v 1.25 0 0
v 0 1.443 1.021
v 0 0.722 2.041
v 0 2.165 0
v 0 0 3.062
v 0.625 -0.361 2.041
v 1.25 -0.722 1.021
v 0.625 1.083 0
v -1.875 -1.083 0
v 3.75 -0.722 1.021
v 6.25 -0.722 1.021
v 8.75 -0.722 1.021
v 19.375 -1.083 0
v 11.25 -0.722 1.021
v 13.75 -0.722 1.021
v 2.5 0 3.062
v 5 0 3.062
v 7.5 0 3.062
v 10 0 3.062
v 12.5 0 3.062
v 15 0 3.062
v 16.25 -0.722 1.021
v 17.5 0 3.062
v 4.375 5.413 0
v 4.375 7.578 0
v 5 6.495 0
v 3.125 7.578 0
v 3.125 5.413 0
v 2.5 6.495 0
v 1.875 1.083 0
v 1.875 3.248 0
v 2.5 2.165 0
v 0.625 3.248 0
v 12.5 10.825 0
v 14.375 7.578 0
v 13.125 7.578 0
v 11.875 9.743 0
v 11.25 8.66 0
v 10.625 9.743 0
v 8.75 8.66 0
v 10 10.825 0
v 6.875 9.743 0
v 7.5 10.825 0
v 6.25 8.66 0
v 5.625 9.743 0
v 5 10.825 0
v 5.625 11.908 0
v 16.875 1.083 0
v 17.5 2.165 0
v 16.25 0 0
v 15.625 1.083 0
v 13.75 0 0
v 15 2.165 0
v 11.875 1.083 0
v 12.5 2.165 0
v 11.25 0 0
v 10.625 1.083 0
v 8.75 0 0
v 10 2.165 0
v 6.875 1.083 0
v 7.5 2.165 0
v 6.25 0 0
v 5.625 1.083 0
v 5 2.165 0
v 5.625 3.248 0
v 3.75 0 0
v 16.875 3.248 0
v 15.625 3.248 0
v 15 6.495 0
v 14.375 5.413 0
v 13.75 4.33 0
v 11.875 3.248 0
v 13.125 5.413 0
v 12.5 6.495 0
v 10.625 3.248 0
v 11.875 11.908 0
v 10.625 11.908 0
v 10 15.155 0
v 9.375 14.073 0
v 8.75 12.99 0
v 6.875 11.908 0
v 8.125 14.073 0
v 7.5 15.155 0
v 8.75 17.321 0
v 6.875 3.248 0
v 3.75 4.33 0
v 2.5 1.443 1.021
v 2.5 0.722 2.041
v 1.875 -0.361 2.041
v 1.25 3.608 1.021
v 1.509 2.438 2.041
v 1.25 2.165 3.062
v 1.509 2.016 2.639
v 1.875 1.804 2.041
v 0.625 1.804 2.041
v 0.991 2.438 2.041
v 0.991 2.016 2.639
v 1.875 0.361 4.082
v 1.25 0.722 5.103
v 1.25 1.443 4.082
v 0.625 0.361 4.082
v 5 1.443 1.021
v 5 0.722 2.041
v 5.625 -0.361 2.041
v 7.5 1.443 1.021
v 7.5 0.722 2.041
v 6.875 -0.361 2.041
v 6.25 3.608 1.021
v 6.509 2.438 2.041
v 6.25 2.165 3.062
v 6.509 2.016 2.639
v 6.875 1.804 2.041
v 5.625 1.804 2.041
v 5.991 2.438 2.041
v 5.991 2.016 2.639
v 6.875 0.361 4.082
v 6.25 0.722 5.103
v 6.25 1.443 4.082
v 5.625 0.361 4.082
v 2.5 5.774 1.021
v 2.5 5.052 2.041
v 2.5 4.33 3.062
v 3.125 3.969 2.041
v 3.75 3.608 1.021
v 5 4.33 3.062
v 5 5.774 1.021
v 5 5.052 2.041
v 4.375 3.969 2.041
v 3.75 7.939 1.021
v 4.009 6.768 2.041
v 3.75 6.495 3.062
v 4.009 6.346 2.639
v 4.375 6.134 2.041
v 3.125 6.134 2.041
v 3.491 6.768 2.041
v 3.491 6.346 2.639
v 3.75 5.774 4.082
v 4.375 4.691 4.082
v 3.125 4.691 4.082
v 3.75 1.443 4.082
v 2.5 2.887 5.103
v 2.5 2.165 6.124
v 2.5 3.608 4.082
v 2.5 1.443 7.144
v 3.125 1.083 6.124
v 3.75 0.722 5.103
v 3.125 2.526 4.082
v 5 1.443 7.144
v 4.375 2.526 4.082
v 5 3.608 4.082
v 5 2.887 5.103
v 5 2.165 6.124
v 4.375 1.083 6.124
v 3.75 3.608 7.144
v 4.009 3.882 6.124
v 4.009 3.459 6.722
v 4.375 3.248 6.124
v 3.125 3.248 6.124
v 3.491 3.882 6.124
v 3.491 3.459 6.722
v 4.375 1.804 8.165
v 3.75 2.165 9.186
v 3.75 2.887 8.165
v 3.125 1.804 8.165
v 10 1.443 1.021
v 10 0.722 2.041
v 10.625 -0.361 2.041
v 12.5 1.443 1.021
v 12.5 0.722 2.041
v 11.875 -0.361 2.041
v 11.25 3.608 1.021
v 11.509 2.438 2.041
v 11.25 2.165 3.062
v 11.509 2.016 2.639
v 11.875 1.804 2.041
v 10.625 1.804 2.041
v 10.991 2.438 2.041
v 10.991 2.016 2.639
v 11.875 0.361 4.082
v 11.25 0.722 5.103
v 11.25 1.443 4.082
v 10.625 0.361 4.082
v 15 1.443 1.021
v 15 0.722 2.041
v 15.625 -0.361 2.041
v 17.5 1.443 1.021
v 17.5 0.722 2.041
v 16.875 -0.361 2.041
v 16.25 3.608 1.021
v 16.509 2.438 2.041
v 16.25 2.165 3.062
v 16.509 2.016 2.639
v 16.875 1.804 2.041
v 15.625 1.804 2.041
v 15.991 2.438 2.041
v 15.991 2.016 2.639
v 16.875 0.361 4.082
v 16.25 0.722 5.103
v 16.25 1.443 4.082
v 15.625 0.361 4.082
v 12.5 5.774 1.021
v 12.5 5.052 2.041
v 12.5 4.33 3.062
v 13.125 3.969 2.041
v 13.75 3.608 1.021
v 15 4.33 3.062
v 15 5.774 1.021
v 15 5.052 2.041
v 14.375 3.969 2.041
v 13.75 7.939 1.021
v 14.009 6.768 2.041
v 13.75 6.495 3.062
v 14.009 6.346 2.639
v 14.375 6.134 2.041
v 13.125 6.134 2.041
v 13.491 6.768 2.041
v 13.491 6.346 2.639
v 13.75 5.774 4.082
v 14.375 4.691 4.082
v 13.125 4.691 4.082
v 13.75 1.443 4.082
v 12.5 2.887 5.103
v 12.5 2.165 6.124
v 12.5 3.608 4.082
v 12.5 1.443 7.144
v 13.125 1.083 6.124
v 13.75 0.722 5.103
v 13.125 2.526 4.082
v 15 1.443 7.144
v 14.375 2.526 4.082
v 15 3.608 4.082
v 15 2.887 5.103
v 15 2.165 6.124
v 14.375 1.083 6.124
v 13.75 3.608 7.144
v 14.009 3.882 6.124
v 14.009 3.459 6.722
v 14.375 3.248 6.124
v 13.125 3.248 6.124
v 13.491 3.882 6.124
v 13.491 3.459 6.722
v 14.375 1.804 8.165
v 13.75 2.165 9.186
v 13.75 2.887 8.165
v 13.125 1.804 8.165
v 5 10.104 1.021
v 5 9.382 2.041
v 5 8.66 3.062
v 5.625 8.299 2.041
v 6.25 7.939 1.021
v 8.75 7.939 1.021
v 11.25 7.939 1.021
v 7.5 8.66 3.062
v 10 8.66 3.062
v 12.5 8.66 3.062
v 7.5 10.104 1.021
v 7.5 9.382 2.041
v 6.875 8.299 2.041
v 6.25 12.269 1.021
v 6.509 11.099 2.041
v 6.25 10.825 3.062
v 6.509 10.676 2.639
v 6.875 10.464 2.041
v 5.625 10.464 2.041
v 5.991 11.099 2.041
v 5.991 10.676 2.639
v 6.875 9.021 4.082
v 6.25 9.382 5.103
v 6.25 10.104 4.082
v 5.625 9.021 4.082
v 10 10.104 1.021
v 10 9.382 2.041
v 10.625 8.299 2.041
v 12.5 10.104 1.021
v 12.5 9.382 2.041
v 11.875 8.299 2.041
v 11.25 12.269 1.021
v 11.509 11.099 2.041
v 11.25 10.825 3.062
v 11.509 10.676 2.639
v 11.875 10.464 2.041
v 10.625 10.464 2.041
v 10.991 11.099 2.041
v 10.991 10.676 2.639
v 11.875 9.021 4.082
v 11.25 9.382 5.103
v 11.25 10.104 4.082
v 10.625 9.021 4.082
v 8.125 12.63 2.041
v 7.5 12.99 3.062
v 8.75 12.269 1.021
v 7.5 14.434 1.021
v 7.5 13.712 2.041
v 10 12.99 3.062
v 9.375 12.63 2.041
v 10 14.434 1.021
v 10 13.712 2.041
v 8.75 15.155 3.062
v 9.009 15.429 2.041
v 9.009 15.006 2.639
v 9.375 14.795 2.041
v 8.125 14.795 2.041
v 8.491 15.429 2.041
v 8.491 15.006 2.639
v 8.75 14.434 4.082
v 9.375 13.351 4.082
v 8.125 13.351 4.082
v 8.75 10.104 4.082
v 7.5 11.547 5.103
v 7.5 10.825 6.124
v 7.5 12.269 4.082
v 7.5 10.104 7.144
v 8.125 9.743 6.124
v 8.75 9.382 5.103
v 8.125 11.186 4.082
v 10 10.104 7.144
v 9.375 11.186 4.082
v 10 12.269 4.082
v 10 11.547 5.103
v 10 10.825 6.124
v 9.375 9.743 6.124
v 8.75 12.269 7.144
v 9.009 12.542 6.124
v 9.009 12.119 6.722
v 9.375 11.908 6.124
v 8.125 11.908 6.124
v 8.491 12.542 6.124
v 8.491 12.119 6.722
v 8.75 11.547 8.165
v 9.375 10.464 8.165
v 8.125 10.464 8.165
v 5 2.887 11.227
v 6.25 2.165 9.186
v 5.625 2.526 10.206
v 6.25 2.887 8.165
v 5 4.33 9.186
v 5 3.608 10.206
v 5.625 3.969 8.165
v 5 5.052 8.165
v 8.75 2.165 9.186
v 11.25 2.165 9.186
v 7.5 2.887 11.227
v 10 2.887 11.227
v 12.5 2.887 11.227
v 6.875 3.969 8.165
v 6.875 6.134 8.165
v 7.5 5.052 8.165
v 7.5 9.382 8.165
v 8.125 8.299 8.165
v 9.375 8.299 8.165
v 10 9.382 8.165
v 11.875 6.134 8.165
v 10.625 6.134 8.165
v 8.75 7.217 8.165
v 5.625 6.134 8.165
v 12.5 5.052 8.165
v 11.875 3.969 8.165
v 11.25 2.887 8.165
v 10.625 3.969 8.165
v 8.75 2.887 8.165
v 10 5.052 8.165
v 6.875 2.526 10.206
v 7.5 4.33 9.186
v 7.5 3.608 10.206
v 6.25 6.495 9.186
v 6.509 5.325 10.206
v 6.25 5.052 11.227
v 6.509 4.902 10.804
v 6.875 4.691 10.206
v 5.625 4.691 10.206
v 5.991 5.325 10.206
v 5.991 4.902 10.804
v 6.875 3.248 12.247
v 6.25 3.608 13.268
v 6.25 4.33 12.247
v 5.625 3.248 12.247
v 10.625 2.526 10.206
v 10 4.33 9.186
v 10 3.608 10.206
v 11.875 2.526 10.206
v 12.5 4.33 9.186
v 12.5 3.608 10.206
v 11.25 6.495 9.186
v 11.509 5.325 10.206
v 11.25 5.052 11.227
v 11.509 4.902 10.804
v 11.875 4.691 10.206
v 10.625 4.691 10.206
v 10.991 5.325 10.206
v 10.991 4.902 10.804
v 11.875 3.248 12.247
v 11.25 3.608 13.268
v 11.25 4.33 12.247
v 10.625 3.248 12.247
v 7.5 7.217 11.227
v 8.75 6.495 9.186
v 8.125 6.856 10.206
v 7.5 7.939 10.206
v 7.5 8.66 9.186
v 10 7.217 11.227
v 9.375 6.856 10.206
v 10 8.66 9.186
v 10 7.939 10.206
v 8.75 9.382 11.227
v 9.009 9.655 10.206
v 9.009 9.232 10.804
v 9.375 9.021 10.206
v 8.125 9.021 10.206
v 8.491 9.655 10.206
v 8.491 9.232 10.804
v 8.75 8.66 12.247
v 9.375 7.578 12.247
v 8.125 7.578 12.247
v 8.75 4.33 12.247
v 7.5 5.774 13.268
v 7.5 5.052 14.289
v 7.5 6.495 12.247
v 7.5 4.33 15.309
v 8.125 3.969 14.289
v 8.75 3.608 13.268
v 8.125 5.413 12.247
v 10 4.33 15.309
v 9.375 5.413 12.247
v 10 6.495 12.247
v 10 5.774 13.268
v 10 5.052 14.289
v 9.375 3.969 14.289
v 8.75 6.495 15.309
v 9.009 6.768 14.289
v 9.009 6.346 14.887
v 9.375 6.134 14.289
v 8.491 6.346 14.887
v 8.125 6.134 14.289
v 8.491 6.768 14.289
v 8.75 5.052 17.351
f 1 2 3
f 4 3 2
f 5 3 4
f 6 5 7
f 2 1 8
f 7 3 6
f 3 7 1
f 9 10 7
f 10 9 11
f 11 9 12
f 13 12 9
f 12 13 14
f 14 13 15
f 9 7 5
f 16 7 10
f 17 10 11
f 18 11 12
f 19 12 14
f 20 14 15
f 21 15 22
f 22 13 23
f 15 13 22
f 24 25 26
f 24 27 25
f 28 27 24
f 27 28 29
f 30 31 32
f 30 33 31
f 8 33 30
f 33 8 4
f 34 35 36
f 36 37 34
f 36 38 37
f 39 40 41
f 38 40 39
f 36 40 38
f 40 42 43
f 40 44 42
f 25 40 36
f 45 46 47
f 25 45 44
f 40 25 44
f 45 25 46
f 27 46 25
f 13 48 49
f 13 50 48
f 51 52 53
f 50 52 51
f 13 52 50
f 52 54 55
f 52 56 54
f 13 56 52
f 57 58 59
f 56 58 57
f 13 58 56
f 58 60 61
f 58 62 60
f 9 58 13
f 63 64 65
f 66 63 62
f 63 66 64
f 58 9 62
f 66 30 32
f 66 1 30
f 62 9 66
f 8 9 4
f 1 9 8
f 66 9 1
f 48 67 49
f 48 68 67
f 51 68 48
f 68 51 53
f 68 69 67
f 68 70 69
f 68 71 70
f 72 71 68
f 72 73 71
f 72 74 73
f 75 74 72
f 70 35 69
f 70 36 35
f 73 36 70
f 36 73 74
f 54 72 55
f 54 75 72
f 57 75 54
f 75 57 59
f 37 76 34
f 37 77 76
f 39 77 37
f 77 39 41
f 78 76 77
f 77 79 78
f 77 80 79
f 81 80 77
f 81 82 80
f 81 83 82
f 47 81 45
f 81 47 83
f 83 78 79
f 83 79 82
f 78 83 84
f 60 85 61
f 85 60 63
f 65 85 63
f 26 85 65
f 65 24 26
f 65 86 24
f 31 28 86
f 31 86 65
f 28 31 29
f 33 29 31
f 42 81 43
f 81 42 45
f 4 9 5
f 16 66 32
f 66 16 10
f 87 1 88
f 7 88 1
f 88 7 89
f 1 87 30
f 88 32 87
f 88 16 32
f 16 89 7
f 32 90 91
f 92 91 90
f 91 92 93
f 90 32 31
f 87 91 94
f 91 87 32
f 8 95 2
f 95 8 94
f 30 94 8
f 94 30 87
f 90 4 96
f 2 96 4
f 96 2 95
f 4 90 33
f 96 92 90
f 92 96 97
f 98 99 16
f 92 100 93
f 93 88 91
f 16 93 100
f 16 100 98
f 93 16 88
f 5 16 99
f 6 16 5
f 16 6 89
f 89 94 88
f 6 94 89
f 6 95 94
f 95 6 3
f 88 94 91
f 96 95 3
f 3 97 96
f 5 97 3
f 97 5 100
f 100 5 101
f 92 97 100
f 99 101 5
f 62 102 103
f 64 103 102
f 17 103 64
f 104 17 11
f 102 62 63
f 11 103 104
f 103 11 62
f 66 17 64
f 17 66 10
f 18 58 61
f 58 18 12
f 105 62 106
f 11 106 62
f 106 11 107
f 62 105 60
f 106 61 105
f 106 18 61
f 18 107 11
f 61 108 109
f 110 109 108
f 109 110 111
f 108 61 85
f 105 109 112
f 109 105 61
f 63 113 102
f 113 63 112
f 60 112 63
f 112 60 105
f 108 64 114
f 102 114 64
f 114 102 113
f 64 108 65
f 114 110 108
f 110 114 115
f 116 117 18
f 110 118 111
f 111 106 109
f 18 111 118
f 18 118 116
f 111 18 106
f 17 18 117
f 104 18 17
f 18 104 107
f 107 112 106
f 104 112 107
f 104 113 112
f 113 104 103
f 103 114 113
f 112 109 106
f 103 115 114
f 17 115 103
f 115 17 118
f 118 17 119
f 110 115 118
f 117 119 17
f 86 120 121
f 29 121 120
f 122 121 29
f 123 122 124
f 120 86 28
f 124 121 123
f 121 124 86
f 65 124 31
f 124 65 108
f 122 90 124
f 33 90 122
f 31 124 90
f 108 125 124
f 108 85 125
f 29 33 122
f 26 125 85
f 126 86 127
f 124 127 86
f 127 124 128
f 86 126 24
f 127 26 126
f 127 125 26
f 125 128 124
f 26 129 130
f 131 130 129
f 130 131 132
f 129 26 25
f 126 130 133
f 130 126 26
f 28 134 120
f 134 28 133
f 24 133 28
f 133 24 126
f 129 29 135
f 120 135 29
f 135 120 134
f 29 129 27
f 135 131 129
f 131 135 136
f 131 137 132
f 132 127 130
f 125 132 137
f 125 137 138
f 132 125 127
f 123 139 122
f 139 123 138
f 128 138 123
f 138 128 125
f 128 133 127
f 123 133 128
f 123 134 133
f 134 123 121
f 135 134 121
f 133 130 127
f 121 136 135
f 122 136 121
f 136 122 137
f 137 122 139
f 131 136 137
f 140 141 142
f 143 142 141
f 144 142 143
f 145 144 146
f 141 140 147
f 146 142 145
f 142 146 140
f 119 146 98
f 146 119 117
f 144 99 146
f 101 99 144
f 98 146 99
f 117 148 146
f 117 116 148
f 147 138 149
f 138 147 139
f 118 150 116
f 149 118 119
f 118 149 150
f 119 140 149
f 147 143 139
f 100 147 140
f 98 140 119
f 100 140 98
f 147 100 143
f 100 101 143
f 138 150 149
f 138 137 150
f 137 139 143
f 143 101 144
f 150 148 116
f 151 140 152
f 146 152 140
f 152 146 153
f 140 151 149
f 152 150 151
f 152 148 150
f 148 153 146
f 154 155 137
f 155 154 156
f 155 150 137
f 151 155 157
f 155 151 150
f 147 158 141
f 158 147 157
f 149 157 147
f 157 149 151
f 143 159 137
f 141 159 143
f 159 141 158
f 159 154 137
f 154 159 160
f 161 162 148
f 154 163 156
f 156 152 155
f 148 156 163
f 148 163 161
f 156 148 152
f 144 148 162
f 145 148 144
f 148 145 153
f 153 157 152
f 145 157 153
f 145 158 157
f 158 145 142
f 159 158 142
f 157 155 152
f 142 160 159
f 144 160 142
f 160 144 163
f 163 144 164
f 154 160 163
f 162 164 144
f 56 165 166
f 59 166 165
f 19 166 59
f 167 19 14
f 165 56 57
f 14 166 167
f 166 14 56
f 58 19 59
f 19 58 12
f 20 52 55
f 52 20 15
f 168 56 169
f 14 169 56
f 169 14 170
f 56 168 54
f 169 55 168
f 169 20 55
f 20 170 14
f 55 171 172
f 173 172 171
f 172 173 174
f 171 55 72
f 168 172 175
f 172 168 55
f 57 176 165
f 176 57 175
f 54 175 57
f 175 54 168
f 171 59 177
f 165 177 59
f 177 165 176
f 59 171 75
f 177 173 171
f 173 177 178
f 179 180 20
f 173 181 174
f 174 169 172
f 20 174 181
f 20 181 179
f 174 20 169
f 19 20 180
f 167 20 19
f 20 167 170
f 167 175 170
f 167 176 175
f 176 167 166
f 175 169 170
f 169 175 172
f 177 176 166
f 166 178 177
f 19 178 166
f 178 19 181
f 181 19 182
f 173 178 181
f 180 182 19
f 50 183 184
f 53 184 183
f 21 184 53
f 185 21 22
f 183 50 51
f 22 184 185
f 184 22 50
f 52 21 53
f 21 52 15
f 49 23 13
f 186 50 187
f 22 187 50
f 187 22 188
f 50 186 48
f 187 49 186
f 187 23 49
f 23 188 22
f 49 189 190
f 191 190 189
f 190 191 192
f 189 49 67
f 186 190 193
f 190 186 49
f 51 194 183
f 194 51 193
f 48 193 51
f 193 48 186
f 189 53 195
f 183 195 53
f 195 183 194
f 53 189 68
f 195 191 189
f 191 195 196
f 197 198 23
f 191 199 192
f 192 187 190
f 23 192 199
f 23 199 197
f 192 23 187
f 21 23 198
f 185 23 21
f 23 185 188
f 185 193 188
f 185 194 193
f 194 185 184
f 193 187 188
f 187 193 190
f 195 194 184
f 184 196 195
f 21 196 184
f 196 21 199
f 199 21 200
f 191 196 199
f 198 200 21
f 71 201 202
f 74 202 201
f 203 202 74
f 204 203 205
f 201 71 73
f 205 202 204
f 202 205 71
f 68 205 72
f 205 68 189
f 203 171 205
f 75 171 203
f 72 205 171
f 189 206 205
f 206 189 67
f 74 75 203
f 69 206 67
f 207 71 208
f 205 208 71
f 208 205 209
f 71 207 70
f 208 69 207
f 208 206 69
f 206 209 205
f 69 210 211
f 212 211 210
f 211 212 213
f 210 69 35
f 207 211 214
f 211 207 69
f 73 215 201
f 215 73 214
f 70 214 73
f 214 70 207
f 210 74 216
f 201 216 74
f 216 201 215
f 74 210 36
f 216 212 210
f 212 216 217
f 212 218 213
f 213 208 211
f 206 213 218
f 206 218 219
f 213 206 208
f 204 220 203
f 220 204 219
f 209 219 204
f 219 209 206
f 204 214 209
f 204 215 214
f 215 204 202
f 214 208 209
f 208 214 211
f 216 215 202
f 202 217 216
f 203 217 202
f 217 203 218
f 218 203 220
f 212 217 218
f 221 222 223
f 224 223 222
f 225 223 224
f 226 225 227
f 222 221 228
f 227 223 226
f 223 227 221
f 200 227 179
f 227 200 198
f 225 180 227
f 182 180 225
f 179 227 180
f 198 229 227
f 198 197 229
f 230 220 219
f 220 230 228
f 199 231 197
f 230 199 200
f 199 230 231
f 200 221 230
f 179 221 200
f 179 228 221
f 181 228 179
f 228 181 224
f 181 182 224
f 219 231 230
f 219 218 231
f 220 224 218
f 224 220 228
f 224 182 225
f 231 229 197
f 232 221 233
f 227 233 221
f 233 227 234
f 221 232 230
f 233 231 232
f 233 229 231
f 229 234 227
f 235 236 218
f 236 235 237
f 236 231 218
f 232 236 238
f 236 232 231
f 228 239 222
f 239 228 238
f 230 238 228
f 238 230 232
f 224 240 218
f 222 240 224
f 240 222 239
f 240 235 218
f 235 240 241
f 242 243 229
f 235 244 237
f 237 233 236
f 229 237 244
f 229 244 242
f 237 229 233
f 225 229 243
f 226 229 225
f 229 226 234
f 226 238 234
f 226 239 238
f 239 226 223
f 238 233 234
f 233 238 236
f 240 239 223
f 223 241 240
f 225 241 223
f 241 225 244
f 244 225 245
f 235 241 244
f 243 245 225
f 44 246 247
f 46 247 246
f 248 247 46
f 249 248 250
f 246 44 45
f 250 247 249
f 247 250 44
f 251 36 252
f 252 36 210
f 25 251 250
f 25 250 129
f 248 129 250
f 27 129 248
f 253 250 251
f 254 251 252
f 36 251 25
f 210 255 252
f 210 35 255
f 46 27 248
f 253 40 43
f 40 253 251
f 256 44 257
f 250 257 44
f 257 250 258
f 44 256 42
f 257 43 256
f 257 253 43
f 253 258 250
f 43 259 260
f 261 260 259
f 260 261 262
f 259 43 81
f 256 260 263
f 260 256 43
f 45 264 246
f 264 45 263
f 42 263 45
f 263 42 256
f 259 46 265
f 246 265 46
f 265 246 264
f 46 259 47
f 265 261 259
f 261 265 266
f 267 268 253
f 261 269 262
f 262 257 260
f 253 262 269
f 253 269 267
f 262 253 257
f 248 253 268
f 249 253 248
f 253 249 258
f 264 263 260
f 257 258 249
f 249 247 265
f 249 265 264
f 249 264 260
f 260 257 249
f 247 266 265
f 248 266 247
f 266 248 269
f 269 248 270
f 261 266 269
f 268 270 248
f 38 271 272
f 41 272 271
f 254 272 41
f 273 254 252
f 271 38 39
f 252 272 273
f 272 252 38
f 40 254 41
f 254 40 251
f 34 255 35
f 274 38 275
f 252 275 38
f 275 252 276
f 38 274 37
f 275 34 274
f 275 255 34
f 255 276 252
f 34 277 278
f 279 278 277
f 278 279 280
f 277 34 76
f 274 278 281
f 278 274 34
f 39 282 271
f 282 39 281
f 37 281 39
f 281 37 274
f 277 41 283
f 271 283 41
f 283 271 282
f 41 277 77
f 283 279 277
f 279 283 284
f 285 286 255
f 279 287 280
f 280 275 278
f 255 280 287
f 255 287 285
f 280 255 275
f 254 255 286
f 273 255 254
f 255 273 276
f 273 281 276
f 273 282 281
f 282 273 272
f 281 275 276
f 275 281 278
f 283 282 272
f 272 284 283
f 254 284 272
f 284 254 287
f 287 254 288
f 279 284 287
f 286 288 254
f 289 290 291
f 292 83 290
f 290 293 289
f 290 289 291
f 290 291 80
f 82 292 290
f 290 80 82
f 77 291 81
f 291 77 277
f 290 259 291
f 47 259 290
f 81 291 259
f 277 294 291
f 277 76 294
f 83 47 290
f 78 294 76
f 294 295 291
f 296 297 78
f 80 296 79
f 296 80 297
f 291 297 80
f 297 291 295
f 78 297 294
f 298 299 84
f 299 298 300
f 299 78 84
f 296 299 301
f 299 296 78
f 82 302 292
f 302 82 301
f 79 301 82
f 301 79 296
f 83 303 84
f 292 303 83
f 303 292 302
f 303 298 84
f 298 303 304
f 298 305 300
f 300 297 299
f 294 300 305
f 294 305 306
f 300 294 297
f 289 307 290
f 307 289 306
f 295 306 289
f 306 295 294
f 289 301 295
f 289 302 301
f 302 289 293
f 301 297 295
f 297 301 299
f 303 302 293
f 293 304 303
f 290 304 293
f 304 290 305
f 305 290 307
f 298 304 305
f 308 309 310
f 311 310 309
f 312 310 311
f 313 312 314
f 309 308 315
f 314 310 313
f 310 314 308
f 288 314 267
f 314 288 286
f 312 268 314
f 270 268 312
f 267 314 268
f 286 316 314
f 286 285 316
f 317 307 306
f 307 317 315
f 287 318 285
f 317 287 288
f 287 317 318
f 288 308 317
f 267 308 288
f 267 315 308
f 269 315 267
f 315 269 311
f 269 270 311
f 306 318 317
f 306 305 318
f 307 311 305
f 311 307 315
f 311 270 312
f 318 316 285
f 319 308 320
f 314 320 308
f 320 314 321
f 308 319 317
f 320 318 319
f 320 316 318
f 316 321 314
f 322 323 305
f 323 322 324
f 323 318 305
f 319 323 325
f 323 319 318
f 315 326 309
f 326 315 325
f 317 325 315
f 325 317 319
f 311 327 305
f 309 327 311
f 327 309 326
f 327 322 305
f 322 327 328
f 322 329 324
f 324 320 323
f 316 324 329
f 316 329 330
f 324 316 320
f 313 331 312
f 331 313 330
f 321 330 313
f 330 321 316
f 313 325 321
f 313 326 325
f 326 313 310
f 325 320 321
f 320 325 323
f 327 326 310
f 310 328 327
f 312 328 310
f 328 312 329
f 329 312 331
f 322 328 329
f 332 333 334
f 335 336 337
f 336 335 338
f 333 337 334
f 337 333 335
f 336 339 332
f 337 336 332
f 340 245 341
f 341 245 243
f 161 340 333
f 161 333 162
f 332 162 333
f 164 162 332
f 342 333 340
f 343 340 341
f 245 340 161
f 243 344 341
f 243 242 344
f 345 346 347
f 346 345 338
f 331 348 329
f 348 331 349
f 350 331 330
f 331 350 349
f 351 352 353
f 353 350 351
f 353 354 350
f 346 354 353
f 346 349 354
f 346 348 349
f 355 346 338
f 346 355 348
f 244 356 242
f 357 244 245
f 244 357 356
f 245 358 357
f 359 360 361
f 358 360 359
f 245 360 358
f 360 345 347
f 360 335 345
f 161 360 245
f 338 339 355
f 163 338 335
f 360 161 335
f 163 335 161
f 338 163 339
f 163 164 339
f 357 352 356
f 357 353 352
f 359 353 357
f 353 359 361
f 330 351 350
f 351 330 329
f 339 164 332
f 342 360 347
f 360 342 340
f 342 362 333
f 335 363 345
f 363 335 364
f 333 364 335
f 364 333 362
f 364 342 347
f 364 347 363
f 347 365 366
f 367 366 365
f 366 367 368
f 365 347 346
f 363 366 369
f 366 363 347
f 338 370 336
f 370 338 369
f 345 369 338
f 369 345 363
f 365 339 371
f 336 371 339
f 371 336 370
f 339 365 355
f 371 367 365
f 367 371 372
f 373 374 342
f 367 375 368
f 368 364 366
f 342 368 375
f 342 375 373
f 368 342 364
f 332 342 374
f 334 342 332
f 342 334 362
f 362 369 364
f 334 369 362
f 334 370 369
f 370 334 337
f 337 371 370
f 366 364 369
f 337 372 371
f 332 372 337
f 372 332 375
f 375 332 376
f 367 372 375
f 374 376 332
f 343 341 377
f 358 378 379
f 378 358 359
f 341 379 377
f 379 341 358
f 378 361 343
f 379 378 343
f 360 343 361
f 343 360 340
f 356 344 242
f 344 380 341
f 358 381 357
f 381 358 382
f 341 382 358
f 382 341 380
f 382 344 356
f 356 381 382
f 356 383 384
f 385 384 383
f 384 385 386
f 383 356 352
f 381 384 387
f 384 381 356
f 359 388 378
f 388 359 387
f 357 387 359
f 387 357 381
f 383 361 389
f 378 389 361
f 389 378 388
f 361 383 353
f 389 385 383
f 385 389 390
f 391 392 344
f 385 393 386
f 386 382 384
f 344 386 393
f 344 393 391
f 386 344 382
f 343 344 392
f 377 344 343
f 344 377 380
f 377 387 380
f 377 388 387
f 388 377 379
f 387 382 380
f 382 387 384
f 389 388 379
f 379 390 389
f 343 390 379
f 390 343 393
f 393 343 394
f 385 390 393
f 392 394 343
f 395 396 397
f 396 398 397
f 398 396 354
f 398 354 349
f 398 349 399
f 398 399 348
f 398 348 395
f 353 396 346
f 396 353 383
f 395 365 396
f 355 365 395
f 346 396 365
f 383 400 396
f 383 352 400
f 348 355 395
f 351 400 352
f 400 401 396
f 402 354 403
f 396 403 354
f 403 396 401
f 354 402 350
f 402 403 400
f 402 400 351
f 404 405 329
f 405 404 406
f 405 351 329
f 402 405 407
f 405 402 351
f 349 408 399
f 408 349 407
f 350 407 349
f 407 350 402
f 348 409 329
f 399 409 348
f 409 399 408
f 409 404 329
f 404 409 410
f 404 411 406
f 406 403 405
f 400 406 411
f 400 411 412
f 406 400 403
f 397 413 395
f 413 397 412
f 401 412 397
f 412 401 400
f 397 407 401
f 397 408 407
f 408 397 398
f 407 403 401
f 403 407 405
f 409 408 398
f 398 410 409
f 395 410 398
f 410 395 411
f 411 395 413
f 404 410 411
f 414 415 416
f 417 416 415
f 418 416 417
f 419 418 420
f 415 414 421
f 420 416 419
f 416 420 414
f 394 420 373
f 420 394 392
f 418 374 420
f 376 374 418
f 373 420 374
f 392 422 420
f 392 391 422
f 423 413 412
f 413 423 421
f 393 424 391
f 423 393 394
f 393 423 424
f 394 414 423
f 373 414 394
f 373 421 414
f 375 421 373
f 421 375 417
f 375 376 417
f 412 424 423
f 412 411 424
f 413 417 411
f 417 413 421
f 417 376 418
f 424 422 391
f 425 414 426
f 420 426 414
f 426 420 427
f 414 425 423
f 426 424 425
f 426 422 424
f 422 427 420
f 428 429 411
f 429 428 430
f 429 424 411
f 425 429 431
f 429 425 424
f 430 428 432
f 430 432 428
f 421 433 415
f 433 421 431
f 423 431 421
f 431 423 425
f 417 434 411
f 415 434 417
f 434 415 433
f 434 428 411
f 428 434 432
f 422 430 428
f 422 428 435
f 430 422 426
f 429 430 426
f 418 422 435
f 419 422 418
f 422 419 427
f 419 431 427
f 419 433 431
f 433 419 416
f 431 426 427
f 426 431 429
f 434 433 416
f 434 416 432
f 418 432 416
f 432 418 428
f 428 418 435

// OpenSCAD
side_length = 10;
overlap = 1.5; //[0.5:0.5:10]
iterations = 4; //[1:8]
useful_length = side_length / pow(2, iterations - 1);

Sierpinski(side_length, iterations) {
    tetrahedron(useful_length);
}
module iterate(side = 10) {
    children(0);
    translate([side, 0, 0]) children(0);
    translate([side / 2, side * sqrt(3) / 2, 0]) children(0);
    translate([side / 2, side * sqrt(3) / 6, side * sqrt(6) / 3 ]) children(0);  
}
module tetrahedron(size) {
    polyhedron( 
        points = [ 
            [0, size * (sqrt(3) - (1 / sqrt(3))), 0], 
            [size, size * (-1 / sqrt(3)), 0], 
            [-size, size * (-1 / sqrt(3)), 0],
            [0, 0, size * 2 * sqrt(2 / 3)]
        ], 
        faces = [
            [0, 1, 3],
            [2, 3, 1], 
            [2, 0, 3],
            [2, 1, 0]
        ]
    );
}
module Sierpinski(side = 10, iterations = 5) {
    if(iterations > 0) {
        iterate(side) {
            Sierpinski(side / 2, iterations - 1) {
                children(0);
            }
        }
        scale(overlap) children(0);
    }
}
